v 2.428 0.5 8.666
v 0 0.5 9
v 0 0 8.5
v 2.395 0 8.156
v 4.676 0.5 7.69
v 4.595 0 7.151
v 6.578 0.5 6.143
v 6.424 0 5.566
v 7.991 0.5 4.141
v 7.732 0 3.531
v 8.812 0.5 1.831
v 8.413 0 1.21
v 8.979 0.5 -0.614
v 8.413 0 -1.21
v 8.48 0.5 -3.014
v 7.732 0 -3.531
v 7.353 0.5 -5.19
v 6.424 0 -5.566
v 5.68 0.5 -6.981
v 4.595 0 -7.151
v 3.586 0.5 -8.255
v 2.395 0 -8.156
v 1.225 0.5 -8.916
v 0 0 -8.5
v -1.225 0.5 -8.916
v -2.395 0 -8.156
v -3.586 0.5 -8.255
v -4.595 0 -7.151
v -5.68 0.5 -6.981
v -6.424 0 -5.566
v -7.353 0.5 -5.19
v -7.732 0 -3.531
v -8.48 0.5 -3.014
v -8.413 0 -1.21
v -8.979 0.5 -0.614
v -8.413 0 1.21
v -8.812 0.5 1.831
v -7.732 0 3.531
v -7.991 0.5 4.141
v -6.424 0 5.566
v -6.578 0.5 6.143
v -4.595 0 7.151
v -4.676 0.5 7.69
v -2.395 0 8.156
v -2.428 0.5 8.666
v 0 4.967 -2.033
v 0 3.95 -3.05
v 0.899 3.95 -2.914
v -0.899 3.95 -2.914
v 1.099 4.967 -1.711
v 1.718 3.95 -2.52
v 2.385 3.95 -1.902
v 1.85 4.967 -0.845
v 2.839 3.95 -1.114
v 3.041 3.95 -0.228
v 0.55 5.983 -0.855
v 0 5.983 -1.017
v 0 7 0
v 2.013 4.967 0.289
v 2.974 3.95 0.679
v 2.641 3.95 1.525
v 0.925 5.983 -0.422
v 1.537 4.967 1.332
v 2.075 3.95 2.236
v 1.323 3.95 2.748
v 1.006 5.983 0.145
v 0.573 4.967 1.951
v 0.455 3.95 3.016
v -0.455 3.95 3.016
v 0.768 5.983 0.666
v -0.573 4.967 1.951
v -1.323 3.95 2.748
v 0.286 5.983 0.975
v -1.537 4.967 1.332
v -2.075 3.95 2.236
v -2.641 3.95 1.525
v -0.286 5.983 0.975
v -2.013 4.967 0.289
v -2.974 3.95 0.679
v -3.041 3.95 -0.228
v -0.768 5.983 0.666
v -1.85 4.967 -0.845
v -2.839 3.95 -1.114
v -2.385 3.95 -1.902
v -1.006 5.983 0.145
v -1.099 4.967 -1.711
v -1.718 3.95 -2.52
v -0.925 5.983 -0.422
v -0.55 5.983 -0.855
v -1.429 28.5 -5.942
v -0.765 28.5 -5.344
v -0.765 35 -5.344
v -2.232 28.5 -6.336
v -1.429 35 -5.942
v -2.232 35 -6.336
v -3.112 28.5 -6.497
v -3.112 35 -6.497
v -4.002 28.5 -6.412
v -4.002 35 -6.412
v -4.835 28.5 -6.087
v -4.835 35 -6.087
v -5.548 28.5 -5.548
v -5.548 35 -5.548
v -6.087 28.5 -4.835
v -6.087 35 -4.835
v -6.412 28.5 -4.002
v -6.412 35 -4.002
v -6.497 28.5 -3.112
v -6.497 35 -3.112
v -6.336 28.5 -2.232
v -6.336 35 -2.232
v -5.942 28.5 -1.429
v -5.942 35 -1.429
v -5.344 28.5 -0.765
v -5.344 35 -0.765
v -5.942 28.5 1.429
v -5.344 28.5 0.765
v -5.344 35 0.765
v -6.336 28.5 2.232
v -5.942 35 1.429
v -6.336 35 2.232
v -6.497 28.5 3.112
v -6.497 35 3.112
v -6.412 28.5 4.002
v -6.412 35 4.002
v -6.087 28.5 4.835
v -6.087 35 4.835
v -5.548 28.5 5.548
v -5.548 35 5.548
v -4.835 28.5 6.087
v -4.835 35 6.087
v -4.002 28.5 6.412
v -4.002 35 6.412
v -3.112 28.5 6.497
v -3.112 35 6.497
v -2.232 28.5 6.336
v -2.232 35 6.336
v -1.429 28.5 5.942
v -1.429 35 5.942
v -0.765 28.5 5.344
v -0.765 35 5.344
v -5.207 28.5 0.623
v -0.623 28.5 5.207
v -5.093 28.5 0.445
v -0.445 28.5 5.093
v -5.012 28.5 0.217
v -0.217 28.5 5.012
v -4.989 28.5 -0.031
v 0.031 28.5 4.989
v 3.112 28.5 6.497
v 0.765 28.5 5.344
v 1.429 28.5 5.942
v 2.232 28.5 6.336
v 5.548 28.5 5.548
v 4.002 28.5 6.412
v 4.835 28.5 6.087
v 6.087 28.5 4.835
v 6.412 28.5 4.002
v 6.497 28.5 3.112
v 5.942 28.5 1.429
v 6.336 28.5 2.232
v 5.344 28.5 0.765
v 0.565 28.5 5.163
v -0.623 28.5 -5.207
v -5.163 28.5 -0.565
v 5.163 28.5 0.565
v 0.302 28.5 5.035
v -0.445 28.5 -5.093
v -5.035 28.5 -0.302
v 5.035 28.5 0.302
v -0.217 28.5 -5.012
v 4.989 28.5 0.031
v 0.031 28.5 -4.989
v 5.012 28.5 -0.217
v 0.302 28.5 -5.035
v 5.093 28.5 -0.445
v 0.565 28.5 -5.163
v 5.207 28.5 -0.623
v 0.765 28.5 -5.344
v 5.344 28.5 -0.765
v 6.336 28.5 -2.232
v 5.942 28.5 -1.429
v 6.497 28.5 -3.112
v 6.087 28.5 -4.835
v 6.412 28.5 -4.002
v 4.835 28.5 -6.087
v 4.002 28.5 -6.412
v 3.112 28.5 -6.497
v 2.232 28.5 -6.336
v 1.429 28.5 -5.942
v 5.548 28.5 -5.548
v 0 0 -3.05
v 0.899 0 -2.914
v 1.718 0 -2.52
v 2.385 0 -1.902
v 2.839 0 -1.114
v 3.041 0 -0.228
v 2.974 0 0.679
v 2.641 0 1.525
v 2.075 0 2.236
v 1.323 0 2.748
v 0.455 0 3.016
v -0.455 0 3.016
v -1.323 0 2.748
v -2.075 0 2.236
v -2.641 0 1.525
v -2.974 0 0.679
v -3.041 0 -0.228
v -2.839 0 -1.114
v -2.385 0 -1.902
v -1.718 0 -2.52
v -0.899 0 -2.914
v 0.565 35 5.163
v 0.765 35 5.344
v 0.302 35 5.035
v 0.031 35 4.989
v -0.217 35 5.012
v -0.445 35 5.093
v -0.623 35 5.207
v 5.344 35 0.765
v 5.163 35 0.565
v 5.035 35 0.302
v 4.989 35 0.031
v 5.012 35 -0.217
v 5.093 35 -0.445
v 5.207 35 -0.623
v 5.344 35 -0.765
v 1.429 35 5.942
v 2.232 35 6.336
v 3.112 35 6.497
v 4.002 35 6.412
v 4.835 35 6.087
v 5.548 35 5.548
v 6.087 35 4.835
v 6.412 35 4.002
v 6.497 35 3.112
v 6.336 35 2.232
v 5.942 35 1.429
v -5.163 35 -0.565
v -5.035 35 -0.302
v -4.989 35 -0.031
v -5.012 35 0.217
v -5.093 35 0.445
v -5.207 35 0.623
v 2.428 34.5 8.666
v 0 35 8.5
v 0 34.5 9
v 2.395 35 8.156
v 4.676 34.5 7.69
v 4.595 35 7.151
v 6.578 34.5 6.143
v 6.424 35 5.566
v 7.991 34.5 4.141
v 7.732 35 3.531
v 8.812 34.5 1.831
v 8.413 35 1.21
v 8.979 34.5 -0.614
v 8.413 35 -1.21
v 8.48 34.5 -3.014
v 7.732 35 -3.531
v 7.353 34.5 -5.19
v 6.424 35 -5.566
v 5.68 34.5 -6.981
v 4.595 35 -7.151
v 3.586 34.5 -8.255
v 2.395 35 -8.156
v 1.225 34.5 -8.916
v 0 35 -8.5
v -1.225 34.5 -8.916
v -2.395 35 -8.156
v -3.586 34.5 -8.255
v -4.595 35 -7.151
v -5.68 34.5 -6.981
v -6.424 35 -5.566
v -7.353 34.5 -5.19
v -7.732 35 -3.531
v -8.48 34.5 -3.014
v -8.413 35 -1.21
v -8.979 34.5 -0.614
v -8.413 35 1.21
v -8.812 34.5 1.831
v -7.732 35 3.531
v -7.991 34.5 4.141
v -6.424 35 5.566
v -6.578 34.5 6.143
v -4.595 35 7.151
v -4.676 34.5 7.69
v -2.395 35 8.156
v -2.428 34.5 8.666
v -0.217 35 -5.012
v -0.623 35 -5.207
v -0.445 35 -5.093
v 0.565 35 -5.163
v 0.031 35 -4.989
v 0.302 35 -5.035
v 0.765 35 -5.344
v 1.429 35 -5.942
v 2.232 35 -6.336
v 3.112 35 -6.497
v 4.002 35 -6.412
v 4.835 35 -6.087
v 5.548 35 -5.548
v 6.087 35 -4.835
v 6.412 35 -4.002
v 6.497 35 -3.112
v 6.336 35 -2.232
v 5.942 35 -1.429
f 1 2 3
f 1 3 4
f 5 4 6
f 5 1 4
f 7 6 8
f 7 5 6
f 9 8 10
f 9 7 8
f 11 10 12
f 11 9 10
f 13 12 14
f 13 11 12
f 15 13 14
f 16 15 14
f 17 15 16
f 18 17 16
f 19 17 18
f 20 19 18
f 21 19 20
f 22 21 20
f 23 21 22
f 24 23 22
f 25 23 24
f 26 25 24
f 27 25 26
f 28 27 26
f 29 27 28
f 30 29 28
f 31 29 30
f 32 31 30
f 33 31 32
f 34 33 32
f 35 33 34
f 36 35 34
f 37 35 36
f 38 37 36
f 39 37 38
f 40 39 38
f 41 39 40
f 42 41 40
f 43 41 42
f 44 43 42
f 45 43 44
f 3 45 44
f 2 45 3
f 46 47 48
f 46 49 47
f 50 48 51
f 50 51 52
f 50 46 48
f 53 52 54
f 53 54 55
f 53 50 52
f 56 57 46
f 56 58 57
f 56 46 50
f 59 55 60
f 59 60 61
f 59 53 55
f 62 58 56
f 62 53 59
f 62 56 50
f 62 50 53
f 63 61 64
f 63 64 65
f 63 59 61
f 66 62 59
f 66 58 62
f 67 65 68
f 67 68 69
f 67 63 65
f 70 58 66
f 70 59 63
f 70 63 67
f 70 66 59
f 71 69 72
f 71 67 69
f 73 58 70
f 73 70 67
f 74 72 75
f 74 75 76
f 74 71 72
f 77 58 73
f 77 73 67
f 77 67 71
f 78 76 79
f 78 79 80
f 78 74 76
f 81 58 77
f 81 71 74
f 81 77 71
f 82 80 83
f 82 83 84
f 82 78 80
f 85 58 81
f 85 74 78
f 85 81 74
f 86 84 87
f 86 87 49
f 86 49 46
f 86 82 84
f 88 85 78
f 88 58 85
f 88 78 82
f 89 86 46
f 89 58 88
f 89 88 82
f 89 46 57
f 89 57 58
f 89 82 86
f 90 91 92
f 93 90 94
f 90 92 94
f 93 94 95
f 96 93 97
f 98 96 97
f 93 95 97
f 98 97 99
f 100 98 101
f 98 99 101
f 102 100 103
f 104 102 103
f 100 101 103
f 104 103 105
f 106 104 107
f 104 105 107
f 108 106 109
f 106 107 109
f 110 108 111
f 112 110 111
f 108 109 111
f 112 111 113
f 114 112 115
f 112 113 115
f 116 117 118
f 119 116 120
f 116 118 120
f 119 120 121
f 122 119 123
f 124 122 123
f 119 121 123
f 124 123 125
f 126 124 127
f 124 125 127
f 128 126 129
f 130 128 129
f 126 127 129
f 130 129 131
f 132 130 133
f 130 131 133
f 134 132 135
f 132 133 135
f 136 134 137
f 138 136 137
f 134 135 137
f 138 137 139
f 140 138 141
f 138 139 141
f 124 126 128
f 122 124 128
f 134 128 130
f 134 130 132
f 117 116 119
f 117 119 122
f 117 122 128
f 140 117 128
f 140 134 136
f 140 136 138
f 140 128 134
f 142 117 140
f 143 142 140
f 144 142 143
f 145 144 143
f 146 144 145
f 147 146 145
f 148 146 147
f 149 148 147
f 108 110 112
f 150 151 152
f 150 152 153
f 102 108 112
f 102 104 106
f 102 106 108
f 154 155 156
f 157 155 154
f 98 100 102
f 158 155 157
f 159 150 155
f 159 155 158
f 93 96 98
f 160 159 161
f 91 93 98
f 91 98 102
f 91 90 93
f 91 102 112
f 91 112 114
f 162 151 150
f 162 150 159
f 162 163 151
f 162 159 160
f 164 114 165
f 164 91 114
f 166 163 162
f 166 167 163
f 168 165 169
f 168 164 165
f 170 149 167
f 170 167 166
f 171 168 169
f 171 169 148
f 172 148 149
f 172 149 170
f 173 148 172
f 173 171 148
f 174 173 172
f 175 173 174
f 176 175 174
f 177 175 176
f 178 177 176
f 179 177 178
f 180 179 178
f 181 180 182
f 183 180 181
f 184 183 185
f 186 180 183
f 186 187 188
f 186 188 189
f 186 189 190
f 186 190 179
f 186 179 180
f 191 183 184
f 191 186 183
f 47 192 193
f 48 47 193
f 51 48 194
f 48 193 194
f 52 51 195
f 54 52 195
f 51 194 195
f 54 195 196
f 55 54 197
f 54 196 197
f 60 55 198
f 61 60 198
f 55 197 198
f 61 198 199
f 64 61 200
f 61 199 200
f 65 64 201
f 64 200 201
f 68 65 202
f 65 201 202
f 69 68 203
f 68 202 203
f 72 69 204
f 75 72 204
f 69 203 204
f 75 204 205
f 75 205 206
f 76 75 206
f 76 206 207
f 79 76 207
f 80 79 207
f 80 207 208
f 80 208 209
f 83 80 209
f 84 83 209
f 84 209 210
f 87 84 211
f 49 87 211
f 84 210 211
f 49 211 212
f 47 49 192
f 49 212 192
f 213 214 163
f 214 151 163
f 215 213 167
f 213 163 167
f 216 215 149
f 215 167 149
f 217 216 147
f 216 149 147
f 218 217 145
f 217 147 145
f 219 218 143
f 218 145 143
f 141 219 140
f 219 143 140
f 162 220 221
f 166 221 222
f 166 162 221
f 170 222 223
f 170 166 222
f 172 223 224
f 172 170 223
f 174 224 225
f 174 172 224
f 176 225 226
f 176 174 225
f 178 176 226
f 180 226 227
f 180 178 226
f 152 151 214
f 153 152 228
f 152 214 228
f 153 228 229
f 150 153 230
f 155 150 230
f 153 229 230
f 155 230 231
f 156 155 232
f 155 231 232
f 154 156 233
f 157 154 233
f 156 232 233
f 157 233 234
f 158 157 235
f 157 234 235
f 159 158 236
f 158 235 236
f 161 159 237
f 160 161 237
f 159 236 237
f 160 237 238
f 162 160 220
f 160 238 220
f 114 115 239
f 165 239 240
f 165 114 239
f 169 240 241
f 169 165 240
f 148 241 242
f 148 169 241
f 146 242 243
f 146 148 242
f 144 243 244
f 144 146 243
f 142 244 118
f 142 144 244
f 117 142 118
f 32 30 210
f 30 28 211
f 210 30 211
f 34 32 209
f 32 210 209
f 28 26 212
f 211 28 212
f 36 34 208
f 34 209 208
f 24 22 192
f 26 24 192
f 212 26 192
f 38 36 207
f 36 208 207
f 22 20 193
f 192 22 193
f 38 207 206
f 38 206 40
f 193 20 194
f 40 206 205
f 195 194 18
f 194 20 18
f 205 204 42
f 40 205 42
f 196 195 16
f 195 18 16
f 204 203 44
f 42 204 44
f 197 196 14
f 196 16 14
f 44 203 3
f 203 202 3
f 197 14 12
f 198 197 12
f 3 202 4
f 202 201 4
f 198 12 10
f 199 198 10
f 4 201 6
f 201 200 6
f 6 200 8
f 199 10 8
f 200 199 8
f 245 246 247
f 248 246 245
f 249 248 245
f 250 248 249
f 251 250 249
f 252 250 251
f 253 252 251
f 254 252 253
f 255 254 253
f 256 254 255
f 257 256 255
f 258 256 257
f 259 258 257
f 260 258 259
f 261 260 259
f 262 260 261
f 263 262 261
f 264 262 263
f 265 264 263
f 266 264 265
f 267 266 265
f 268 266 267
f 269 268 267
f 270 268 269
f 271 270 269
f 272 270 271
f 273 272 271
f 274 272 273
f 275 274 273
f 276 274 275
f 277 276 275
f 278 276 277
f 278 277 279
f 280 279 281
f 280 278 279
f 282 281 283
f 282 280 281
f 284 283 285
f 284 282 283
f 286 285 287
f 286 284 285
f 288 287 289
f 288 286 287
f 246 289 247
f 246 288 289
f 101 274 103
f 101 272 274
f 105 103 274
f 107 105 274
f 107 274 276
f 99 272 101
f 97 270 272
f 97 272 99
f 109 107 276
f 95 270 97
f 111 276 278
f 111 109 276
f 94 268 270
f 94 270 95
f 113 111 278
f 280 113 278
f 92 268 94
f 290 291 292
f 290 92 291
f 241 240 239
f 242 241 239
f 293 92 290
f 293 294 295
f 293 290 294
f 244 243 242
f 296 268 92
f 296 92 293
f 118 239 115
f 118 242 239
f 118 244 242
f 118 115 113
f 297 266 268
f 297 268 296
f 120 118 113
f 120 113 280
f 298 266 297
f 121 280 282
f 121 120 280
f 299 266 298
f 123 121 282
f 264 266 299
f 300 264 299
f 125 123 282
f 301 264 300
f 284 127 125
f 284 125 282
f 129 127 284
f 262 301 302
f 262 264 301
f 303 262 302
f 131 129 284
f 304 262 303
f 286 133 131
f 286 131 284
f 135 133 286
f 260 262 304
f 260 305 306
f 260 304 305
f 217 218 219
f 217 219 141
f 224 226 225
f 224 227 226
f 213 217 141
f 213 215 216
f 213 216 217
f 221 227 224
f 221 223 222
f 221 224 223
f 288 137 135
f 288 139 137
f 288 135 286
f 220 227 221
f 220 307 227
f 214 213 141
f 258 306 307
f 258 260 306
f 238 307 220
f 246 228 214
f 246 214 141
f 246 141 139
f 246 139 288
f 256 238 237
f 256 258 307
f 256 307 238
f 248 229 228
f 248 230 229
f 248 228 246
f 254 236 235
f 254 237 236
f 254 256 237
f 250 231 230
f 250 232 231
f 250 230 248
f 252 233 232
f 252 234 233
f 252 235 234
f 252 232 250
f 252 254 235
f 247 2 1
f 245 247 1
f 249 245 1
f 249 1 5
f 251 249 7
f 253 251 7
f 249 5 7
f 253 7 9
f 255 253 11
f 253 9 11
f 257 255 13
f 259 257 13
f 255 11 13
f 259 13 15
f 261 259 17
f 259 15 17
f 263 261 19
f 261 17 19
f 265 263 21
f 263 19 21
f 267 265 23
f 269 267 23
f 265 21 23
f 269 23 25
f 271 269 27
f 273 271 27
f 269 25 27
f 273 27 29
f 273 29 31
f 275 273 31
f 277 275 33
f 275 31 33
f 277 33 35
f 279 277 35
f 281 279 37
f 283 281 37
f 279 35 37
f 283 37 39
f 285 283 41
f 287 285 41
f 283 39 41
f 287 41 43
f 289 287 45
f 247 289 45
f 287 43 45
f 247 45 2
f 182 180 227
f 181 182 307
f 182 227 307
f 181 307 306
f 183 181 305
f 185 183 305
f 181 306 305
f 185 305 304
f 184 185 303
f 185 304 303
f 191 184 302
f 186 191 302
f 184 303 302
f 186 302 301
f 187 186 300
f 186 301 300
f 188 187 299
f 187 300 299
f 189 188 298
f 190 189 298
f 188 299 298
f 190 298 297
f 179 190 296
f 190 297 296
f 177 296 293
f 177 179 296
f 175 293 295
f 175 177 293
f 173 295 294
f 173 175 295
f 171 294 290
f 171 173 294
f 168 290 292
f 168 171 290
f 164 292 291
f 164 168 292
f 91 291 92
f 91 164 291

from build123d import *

# Parameters (mm, degrees)
SKETCH3_R           = 9
BOSS_EXTRUDE3_DEPTH = 35
CUT_EXTRUDE1_DEPTH  = 6.5
FILLET1_R           = 1
SKETCH1_R           = 3.05
CUT_EXTRUDE2_DEPTH  = 7
CHAMFER1_SIZE       = 3.05
CHAMFER2_SIZE       = 0.5


with BuildPart() as part:
    # Sketch3 → Boss-Extrude3 (new body)
    with BuildSketch(Plane(origin=(0, 0, 0), x_dir=(1, 0, 0), z_dir=(0, 1, 0))):
        with Locations(Location((0, 0, 0), (0, 0, 270))):
            Circle(SKETCH3_R)
    extrude(amount=BOSS_EXTRUDE3_DEPTH)

    # Sketch4 → Cut-Extrude1 (cut)
    with BuildSketch(Plane(origin=(0, 35, 0), x_dir=(1, 0, 0), z_dir=(0, 1, 0))):
        with BuildLine():
            ThreePointArc((0, -3.25), (5.548097039, -5.548097039), (3.25, 0))
            ThreePointArc((3.25, 0), (5.548097039, 5.548097039), (0, 3.25))
            ThreePointArc((0, 3.25), (-5.548097039, 5.548097039), (-3.25, 0))
            ThreePointArc((-3.25, 0), (-5.548097039, -5.548097039), (0, -3.25))
        make_face()
    extrude(amount=-CUT_EXTRUDE1_DEPTH, mode=Mode.SUBTRACT)

    # Fillet1
    fillet1_edges = [part.edges().sort_by_distance(p)[0] for p in [
        (-3.25, 31.75, 0),
        (0, 31.75, -3.25),
        (3.25, 31.75, 0),
        (0, 31.75, 3.25),
    ]]
    fillet(fillet1_edges, radius=FILLET1_R)

    # Sketch1 → Cut-Extrude2 (cut)
    with BuildSketch(Plane(origin=(0, 0, 0), x_dir=(-1, 0, 0), z_dir=(0, -1, 0))):
        with Locations(Location((0, 0, 0), (0, 0, 90))):
            Circle(SKETCH1_R)
    extrude(amount=-CUT_EXTRUDE2_DEPTH, mode=Mode.SUBTRACT)

    # Chamfer1
    chamfer1_edges = [part.edges().sort_by_distance(p)[0] for p in [
        (0, 7, 3.05),
    ]]
    chamfer(chamfer1_edges, length=CHAMFER1_SIZE)

    # Chamfer2
    chamfer2_edges = [part.edges().sort_by_distance(p)[0] for p in [
        (0, 0, -9),
        (0, 35, -9),
    ]]
    chamfer(chamfer2_edges, length=CHAMFER2_SIZE)


solid = part.part
